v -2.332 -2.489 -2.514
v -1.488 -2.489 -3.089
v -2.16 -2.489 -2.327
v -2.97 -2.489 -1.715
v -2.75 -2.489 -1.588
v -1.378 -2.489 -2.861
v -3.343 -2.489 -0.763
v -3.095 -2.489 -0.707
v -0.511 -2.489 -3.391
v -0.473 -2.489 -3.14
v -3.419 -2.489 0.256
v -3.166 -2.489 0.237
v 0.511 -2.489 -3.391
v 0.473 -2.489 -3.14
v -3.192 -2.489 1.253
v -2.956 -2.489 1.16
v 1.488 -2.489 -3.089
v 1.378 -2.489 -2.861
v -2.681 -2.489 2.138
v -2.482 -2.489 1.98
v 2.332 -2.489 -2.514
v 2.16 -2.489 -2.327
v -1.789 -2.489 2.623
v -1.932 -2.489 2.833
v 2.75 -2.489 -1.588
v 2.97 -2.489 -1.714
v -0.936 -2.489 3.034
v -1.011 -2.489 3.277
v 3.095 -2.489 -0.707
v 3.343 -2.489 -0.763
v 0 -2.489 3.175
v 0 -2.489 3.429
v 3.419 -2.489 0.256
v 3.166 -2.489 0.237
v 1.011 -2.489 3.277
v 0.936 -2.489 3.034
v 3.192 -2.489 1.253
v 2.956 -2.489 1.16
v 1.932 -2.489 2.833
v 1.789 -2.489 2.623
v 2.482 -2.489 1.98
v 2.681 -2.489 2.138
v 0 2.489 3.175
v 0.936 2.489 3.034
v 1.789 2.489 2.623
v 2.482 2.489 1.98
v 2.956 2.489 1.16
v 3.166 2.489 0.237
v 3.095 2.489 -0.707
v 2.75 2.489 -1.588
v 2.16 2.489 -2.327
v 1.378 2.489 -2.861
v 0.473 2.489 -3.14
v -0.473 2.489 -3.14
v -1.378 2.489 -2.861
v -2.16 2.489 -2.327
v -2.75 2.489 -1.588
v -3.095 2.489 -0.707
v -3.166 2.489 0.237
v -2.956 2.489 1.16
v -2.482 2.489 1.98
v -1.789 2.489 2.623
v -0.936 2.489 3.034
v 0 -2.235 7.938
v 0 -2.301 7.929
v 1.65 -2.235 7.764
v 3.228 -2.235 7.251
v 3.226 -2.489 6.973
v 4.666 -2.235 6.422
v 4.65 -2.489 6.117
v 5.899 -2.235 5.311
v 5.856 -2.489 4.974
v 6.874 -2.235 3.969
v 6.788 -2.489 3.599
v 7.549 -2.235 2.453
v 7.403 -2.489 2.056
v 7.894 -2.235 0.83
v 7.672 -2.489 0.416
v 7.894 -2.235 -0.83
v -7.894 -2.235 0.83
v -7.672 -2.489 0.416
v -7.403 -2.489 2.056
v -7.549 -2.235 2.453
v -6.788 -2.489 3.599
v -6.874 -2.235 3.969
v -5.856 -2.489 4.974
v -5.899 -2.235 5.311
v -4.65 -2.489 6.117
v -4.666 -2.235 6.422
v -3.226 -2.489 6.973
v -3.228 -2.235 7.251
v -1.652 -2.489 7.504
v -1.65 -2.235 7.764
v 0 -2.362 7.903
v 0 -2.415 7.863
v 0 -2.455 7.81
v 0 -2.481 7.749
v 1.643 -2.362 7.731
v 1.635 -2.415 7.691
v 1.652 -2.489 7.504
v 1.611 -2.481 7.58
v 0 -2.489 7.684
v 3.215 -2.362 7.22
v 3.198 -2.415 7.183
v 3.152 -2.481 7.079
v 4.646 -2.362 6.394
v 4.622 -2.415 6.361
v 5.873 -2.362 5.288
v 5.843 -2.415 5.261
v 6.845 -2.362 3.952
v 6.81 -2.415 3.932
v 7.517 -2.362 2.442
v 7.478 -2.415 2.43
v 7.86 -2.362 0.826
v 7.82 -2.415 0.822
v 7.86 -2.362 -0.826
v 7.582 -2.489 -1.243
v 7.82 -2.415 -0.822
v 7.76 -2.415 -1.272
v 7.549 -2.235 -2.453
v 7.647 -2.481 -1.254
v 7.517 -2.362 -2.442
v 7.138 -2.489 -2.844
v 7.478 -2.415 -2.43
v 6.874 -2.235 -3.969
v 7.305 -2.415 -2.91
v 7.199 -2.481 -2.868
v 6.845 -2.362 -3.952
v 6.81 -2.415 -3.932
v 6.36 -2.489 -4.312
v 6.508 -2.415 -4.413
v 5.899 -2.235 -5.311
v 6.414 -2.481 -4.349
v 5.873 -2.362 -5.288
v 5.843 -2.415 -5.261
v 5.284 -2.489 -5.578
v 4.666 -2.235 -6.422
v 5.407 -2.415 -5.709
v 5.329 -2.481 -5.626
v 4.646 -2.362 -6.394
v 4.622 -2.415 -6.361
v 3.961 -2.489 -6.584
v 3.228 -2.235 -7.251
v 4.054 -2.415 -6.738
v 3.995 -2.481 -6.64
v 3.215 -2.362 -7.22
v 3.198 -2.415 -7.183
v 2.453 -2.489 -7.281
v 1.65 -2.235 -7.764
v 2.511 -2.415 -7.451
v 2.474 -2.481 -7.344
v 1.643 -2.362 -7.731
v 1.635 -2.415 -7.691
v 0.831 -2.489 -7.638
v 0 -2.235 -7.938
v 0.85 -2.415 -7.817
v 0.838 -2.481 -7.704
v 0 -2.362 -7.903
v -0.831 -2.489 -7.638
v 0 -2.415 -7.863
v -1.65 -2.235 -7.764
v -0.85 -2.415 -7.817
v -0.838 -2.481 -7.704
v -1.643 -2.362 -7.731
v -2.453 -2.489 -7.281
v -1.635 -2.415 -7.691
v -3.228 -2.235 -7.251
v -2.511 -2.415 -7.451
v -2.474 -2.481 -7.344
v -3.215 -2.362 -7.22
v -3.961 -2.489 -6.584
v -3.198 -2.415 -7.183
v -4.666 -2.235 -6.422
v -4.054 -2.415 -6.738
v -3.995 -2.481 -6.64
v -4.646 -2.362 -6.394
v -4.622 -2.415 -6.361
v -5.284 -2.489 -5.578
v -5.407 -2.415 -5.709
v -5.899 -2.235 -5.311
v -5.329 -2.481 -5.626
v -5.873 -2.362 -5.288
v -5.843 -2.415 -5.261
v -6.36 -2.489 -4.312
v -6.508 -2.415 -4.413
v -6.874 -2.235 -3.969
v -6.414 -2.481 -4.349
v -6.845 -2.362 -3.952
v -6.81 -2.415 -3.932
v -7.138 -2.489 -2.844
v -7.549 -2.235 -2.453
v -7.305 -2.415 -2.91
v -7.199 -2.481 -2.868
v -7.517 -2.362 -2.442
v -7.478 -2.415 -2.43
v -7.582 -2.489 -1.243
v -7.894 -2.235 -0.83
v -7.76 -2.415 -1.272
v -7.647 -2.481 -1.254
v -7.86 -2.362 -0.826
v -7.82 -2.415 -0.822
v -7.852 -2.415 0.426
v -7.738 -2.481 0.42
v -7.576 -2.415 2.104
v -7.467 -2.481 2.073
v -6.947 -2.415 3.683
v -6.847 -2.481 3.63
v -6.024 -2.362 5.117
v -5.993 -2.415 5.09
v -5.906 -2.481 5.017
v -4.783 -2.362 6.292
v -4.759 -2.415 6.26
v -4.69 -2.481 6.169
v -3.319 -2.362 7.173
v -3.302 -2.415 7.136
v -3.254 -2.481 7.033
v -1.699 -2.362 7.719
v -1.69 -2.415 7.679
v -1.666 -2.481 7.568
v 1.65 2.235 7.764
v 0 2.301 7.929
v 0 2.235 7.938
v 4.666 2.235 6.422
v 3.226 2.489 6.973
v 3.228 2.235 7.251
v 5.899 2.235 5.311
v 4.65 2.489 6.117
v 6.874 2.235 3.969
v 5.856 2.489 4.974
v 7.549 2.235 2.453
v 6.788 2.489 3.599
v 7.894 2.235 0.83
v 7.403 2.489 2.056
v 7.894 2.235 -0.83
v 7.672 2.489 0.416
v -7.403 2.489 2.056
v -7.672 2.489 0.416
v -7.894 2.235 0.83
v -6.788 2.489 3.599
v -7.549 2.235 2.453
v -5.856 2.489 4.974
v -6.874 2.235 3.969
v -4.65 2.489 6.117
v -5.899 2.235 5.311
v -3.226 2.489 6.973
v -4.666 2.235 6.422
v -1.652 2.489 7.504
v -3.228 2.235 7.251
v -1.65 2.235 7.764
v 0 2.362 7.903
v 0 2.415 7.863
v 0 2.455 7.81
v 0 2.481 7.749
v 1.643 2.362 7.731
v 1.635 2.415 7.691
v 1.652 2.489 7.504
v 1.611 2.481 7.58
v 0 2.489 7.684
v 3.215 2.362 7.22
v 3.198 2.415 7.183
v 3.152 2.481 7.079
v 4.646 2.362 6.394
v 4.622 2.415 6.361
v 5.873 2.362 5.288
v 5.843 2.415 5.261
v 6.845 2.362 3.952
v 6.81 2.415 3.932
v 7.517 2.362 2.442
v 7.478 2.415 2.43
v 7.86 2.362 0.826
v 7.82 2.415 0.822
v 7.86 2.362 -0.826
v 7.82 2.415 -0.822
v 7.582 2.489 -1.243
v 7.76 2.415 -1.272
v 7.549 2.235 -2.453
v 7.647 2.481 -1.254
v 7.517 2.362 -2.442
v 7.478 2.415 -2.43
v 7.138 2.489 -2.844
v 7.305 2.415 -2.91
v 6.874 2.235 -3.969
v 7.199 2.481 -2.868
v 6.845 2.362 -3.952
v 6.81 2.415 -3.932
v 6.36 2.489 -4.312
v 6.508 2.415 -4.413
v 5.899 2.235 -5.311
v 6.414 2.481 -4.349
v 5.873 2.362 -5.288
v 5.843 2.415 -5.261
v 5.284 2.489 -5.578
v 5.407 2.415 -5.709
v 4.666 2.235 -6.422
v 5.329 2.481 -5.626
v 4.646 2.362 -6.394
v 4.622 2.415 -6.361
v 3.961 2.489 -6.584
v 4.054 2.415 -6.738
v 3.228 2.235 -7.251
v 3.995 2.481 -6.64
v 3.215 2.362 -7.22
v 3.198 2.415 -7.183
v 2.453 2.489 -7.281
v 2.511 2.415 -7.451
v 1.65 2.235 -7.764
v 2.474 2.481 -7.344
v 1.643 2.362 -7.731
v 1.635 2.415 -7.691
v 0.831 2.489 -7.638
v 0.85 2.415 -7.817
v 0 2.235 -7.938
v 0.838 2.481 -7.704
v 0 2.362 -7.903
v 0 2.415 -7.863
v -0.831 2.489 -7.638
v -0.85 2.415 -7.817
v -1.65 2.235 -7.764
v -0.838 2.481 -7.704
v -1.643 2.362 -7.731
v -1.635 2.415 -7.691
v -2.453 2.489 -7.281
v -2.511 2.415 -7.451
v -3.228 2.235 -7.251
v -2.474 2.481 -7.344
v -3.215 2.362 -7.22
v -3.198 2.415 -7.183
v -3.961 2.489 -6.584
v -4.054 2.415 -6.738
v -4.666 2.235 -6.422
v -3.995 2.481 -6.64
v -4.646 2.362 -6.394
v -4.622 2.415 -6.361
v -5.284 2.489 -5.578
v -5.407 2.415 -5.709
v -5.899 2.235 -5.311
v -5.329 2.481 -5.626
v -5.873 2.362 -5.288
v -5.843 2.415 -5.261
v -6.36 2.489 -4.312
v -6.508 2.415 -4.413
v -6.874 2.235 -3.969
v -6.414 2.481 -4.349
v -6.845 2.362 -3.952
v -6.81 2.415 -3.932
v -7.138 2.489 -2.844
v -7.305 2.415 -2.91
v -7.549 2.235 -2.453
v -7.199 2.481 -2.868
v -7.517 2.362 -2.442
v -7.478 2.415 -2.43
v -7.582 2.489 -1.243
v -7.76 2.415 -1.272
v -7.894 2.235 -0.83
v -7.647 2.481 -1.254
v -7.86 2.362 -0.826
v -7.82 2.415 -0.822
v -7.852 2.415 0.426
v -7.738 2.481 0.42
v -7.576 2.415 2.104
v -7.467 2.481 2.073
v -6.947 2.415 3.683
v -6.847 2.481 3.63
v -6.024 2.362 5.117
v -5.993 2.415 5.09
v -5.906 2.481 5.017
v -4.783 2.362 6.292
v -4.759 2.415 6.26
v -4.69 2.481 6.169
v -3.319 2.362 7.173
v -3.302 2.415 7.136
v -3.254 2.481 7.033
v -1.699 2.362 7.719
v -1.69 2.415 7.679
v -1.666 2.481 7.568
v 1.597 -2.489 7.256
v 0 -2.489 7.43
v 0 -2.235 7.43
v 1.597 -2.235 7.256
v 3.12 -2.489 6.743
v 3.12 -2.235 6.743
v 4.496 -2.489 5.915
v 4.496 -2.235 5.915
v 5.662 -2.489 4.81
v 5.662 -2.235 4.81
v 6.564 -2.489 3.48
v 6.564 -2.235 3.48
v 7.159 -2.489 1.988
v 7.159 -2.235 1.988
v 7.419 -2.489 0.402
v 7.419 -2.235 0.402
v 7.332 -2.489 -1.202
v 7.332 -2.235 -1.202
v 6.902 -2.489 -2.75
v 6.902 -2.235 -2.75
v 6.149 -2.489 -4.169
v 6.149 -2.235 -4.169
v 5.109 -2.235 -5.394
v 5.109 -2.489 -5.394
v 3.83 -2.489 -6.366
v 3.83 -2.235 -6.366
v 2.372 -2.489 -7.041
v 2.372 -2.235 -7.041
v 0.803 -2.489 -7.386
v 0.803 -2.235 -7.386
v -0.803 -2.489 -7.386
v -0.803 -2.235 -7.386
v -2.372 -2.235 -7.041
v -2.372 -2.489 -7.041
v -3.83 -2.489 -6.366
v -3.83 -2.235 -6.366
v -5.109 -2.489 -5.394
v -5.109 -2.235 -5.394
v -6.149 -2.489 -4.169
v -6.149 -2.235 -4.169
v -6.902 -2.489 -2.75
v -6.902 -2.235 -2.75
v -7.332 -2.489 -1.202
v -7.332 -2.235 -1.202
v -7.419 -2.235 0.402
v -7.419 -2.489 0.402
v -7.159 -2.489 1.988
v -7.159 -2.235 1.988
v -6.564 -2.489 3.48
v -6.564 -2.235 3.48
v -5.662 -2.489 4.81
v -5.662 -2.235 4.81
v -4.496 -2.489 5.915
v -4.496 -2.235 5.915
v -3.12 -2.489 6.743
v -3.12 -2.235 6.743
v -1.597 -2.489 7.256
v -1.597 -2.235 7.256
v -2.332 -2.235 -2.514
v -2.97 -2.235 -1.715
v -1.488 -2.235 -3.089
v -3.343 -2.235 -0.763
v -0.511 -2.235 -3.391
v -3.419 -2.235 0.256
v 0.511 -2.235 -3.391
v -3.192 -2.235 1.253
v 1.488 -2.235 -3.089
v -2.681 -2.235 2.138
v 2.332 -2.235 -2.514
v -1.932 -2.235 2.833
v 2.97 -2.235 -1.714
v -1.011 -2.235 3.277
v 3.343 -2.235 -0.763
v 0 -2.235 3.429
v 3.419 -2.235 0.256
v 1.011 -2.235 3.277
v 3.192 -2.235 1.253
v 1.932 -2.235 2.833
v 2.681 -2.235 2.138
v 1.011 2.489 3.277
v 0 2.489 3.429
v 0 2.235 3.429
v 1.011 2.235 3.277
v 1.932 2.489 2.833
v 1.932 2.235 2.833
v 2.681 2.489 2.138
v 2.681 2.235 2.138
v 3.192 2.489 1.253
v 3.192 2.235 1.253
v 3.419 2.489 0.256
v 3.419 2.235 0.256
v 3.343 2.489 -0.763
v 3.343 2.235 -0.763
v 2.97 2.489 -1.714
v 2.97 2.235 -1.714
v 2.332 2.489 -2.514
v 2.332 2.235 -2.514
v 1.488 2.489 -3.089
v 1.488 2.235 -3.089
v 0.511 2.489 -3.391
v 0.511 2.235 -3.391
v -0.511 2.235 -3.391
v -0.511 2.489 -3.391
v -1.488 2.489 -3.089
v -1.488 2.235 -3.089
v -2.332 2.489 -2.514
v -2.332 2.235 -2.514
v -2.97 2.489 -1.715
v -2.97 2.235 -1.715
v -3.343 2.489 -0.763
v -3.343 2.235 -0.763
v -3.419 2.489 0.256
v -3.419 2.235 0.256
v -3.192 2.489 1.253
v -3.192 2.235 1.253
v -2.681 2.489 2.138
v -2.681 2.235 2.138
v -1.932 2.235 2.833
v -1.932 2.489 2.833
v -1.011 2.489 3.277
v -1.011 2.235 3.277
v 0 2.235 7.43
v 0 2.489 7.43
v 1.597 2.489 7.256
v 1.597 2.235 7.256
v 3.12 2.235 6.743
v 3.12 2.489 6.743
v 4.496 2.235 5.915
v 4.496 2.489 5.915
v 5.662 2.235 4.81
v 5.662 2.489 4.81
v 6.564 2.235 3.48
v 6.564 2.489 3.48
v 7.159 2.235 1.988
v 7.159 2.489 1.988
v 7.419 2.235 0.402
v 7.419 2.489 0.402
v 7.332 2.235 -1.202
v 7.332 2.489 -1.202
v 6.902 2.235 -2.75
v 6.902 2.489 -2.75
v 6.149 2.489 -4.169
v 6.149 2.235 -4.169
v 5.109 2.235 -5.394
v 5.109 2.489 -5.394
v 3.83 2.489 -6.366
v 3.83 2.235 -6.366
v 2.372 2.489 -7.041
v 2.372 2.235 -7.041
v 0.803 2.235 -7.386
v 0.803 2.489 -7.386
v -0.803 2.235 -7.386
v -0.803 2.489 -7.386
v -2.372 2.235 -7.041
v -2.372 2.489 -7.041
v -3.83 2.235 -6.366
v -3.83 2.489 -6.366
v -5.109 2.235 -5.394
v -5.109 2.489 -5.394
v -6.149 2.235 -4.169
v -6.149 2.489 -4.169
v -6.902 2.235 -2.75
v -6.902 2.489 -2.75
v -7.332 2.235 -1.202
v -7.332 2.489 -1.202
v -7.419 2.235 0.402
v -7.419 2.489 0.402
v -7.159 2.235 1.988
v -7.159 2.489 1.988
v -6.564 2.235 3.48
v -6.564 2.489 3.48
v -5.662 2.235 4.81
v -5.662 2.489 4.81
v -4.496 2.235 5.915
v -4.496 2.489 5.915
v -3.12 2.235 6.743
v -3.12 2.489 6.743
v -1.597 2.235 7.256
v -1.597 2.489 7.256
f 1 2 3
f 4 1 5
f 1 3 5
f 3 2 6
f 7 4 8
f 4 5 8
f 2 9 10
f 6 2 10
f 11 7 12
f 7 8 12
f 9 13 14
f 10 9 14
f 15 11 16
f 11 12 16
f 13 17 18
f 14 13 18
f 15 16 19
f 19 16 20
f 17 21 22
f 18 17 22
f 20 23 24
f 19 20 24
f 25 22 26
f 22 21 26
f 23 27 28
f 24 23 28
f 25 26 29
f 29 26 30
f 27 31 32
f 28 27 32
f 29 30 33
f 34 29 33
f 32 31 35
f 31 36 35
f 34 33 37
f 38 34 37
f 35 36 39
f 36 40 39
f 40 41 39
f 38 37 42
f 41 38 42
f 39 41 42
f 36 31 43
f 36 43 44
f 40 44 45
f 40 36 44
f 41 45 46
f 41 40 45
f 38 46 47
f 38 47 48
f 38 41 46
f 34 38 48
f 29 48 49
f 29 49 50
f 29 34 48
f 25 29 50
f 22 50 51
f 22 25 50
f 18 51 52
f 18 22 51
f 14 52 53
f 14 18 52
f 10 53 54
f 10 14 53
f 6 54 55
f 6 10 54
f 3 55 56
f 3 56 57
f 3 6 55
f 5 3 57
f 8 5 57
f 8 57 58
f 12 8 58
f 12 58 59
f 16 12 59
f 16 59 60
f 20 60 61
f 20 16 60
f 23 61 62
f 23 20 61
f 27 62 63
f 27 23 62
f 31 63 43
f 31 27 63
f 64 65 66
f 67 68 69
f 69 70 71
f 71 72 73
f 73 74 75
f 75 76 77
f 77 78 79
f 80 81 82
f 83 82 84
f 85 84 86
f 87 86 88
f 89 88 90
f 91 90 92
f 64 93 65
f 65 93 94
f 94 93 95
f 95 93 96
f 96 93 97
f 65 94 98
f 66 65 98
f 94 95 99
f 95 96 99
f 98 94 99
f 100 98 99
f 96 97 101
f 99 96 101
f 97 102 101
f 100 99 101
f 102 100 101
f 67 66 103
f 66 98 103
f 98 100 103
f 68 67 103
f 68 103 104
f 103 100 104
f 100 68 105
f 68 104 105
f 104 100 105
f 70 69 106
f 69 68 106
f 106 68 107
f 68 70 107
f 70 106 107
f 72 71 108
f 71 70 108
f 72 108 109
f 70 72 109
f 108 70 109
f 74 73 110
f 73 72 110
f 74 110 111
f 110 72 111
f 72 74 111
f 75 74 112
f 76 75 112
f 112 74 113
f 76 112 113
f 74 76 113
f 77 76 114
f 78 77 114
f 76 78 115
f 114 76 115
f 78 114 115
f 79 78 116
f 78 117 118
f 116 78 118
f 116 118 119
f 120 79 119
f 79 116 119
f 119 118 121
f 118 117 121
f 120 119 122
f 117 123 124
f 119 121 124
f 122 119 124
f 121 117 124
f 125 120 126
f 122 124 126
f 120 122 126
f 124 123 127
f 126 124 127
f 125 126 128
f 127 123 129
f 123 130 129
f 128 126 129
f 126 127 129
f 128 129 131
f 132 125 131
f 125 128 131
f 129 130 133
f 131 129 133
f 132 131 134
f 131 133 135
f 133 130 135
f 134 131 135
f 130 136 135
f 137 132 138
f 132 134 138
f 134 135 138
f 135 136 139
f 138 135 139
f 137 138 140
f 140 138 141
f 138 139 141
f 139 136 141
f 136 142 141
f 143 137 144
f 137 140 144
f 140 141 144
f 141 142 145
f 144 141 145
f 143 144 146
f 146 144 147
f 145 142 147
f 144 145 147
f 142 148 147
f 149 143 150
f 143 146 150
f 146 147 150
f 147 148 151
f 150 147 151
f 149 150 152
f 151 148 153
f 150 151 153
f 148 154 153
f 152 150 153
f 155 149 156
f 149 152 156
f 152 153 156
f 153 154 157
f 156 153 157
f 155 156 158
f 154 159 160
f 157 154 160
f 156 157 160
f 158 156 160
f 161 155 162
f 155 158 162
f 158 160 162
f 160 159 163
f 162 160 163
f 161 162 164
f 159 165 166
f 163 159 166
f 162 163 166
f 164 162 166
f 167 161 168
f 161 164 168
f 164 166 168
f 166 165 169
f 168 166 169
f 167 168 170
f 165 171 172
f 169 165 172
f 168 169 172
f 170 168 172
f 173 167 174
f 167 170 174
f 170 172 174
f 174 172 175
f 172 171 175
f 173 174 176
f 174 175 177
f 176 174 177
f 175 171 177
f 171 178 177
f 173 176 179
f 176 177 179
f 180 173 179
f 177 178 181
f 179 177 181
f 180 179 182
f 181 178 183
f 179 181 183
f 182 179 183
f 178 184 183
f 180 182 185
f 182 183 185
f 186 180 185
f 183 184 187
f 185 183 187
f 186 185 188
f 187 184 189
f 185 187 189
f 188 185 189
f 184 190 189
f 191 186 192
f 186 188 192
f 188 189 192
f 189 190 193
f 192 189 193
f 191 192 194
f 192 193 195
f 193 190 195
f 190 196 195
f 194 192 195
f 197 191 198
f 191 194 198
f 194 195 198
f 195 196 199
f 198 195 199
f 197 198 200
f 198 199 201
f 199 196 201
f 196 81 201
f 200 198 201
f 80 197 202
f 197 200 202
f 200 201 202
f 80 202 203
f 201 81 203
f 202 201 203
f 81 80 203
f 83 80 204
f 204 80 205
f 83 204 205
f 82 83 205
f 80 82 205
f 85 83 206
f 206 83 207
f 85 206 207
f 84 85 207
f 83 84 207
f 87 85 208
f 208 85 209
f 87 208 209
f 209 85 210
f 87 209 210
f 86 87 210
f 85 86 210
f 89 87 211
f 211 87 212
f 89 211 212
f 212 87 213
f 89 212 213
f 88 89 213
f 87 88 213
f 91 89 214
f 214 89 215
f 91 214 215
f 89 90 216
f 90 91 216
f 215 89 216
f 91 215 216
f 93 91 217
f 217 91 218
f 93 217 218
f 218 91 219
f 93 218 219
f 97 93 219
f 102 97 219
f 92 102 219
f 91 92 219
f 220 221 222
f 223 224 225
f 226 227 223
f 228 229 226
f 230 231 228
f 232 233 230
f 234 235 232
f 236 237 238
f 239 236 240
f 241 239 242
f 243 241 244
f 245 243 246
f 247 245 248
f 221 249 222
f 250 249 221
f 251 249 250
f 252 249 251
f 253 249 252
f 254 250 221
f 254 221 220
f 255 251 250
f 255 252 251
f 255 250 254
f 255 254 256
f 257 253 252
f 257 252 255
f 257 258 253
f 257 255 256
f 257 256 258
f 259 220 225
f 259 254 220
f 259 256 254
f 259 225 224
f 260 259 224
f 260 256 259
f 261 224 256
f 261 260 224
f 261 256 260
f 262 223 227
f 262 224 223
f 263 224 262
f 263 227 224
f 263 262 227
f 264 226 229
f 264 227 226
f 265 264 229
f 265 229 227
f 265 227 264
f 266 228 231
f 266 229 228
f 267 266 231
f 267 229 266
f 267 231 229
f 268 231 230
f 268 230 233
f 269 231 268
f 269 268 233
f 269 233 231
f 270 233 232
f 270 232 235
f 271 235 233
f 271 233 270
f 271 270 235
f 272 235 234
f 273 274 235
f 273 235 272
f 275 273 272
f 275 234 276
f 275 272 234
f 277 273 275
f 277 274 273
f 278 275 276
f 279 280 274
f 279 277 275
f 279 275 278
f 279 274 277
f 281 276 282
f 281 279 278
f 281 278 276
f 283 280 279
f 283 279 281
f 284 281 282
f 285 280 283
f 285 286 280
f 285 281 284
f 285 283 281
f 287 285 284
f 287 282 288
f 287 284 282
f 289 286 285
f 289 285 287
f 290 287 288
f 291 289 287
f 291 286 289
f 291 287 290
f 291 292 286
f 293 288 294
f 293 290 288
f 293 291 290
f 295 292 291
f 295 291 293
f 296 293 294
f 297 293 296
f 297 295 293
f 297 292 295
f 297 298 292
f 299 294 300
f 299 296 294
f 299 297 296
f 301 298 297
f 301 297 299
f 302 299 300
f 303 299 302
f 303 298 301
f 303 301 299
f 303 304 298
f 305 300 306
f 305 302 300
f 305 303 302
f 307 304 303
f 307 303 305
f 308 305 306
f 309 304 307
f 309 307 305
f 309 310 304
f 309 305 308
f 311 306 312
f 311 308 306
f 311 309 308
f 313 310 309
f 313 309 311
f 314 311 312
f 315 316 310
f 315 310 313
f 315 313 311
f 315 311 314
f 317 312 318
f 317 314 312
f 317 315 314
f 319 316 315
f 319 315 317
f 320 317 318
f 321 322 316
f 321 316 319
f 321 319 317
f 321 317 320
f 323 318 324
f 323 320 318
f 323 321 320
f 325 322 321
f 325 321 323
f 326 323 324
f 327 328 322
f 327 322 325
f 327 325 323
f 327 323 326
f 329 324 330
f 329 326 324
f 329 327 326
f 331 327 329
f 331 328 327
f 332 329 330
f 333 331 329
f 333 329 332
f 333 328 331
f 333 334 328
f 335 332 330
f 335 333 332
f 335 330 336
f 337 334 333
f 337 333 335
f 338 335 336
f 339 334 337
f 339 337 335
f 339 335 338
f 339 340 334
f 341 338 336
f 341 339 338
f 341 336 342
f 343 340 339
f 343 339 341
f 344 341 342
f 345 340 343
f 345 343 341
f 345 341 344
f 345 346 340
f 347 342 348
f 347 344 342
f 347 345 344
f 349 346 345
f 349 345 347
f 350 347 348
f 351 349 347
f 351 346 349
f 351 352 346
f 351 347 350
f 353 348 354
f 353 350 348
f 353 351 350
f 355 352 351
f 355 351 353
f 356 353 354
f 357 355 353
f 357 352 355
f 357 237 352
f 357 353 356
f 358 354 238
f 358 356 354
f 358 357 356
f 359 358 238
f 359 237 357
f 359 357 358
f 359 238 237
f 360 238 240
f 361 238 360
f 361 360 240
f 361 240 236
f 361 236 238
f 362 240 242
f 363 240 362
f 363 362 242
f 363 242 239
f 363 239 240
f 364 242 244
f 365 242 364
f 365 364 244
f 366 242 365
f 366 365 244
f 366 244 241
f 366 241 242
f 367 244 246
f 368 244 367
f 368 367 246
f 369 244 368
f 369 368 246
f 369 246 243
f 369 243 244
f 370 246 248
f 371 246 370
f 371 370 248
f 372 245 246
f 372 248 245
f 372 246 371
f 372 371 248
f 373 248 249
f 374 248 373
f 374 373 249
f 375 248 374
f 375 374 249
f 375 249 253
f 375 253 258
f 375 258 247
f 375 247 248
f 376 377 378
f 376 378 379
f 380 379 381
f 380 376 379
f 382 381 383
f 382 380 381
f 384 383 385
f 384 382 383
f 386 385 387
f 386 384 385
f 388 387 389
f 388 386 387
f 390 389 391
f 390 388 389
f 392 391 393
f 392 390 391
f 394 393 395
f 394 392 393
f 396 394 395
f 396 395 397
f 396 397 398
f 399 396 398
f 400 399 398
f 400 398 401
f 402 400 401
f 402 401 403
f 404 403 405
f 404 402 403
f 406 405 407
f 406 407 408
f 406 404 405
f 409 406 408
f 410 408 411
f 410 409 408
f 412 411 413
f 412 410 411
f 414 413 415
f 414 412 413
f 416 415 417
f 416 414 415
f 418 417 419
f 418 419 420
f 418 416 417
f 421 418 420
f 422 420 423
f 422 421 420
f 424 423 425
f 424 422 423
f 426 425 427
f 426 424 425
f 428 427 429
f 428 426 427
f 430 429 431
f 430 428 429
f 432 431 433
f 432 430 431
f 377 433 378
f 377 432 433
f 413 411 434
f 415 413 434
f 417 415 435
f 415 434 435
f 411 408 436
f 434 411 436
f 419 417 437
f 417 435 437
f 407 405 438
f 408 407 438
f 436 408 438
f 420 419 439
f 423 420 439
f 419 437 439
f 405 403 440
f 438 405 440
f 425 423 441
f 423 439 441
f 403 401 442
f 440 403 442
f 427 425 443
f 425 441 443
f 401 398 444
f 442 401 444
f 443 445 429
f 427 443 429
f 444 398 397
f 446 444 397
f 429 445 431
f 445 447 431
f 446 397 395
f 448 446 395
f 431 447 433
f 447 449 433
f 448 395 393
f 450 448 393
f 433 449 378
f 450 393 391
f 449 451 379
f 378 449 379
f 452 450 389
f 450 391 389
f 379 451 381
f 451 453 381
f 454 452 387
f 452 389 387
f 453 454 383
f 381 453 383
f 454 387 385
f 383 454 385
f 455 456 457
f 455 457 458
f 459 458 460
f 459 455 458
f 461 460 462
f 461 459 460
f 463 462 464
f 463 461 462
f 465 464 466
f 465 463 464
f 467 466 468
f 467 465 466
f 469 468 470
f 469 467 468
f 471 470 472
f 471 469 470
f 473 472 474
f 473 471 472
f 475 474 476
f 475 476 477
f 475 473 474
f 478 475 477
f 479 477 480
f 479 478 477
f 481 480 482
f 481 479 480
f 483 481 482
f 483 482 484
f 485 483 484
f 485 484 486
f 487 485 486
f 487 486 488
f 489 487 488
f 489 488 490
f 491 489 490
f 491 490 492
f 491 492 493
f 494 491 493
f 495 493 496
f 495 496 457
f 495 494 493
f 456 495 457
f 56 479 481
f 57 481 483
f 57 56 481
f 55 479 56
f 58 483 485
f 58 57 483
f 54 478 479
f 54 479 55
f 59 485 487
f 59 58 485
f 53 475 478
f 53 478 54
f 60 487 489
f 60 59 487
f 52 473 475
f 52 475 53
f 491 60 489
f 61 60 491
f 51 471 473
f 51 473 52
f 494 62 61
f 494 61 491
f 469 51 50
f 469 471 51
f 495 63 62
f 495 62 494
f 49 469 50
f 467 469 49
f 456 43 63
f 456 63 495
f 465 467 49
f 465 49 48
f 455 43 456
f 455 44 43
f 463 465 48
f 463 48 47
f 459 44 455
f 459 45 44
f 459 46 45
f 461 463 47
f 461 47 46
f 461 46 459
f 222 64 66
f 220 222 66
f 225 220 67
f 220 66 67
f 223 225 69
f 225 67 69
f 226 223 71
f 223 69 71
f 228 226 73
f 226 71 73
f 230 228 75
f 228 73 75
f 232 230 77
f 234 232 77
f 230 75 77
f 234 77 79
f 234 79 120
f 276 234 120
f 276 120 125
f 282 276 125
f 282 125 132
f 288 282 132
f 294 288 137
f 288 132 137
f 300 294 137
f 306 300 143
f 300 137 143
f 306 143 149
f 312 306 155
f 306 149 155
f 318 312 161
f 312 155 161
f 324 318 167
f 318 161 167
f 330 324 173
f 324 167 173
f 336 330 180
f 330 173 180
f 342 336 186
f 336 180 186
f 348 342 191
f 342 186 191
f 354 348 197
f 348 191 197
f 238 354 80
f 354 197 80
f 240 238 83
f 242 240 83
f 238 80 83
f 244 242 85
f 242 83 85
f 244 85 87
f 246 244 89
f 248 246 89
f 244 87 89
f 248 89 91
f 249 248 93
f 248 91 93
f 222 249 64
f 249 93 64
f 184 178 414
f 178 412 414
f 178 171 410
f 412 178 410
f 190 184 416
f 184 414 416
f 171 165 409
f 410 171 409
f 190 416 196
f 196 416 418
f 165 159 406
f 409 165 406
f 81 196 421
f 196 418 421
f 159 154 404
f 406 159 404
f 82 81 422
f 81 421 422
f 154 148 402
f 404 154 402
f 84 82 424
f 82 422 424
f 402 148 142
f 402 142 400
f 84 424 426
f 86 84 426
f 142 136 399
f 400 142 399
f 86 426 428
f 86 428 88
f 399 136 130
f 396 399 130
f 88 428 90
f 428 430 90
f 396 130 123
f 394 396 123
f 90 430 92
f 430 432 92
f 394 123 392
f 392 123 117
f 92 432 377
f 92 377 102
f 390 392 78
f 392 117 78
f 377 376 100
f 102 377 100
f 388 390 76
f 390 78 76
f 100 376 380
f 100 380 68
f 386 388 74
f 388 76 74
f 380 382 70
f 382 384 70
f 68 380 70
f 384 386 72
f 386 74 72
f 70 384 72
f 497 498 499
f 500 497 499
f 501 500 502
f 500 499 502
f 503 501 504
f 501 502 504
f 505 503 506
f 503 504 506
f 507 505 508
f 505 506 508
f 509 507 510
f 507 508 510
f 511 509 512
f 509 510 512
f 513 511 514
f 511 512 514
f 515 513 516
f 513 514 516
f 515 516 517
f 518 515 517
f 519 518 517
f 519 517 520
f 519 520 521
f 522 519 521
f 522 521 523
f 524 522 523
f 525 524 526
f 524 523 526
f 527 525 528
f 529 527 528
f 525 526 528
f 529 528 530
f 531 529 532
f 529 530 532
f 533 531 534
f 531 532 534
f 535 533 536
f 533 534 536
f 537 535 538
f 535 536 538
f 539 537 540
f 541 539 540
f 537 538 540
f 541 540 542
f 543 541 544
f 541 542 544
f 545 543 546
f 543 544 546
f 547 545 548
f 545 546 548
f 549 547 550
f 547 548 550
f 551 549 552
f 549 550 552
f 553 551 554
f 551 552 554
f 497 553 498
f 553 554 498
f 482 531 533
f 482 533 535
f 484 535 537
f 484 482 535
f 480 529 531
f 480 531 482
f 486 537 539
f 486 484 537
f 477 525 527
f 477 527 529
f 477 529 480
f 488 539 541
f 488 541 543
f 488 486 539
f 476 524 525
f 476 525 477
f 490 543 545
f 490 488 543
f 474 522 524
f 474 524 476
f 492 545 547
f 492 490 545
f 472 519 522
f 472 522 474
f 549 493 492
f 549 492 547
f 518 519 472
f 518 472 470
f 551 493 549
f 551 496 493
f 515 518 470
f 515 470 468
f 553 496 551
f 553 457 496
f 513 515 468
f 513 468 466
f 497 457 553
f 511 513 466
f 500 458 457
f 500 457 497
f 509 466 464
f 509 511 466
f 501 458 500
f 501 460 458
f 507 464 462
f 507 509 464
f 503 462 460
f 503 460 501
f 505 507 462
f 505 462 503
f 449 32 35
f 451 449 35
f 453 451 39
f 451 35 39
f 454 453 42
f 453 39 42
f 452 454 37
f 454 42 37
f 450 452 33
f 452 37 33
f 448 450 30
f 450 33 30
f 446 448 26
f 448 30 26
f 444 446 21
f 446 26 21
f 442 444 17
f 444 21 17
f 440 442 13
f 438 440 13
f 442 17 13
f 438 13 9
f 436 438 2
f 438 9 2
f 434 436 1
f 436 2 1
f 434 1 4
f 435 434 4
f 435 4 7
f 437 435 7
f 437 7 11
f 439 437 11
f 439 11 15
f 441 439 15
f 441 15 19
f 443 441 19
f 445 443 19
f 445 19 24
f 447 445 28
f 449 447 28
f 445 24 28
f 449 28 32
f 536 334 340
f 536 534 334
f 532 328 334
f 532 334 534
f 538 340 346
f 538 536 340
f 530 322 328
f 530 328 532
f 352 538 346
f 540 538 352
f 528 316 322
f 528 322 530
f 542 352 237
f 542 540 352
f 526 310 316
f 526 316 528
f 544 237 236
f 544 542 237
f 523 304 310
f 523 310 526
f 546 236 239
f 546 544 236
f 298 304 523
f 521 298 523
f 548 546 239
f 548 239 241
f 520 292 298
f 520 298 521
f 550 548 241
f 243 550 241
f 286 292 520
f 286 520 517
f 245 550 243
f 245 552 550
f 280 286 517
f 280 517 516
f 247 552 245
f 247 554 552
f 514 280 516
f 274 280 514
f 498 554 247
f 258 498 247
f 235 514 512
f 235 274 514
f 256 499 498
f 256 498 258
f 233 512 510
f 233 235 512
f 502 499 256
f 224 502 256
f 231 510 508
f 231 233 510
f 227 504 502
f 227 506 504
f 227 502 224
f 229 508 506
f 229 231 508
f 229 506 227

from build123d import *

# Parameters (mm, degrees)
BOSS_EXTRUDE1_DEPTH      = 2.4892
BOSS_EXTRUDE1_DEPTH_BACK = 2.4892
SKETCH1_R                = 7.9375
SKETCH1_R_2              = 3.175
FILLET1_R                = 0.254
SKETCH2_R                = 7.4295
SKETCH2_R_2              = 3.429
CUT_EXTRUDE1_DEPTH       = 0.254


with BuildPart() as part:
    # Sketch1 → Boss-Extrude1 (new, two sides: drawn at the far end of the back side and taken through both)
    with BuildSketch(Plane(origin=(0, 0, 0), x_dir=(1, 0, 0), z_dir=(0, 1, 0)).offset(-BOSS_EXTRUDE1_DEPTH_BACK)):
        Circle(SKETCH1_R)
        Circle(SKETCH1_R_2, mode=Mode.SUBTRACT)
    extrude(amount=BOSS_EXTRUDE1_DEPTH + BOSS_EXTRUDE1_DEPTH_BACK)

    # Fillet1
    fillet1_edges = [part.edges().sort_by_distance(p)[0] for p in [
        (-7.9375, -2.4892, 0),
        (-7.9375, 2.4892, 0),
    ]]
    fillet(fillet1_edges, radius=FILLET1_R)

    # Sketch2 → Cut-Extrude1 (cut)
    with BuildSketch(Plane(origin=(0, 2.4892, 0), x_dir=(1, 0, 0), z_dir=(0, 1, 0))):
        Circle(SKETCH2_R)
        Circle(SKETCH2_R_2, mode=Mode.SUBTRACT)
    cut_extrude1 = extrude(amount=-CUT_EXTRUDE1_DEPTH, mode=Mode.SUBTRACT)

    # Mirror1: Cut-Extrude1 across plane
    add(cut_extrude1.mirror(Plane.ZX), mode=Mode.SUBTRACT)


solid = part.part
